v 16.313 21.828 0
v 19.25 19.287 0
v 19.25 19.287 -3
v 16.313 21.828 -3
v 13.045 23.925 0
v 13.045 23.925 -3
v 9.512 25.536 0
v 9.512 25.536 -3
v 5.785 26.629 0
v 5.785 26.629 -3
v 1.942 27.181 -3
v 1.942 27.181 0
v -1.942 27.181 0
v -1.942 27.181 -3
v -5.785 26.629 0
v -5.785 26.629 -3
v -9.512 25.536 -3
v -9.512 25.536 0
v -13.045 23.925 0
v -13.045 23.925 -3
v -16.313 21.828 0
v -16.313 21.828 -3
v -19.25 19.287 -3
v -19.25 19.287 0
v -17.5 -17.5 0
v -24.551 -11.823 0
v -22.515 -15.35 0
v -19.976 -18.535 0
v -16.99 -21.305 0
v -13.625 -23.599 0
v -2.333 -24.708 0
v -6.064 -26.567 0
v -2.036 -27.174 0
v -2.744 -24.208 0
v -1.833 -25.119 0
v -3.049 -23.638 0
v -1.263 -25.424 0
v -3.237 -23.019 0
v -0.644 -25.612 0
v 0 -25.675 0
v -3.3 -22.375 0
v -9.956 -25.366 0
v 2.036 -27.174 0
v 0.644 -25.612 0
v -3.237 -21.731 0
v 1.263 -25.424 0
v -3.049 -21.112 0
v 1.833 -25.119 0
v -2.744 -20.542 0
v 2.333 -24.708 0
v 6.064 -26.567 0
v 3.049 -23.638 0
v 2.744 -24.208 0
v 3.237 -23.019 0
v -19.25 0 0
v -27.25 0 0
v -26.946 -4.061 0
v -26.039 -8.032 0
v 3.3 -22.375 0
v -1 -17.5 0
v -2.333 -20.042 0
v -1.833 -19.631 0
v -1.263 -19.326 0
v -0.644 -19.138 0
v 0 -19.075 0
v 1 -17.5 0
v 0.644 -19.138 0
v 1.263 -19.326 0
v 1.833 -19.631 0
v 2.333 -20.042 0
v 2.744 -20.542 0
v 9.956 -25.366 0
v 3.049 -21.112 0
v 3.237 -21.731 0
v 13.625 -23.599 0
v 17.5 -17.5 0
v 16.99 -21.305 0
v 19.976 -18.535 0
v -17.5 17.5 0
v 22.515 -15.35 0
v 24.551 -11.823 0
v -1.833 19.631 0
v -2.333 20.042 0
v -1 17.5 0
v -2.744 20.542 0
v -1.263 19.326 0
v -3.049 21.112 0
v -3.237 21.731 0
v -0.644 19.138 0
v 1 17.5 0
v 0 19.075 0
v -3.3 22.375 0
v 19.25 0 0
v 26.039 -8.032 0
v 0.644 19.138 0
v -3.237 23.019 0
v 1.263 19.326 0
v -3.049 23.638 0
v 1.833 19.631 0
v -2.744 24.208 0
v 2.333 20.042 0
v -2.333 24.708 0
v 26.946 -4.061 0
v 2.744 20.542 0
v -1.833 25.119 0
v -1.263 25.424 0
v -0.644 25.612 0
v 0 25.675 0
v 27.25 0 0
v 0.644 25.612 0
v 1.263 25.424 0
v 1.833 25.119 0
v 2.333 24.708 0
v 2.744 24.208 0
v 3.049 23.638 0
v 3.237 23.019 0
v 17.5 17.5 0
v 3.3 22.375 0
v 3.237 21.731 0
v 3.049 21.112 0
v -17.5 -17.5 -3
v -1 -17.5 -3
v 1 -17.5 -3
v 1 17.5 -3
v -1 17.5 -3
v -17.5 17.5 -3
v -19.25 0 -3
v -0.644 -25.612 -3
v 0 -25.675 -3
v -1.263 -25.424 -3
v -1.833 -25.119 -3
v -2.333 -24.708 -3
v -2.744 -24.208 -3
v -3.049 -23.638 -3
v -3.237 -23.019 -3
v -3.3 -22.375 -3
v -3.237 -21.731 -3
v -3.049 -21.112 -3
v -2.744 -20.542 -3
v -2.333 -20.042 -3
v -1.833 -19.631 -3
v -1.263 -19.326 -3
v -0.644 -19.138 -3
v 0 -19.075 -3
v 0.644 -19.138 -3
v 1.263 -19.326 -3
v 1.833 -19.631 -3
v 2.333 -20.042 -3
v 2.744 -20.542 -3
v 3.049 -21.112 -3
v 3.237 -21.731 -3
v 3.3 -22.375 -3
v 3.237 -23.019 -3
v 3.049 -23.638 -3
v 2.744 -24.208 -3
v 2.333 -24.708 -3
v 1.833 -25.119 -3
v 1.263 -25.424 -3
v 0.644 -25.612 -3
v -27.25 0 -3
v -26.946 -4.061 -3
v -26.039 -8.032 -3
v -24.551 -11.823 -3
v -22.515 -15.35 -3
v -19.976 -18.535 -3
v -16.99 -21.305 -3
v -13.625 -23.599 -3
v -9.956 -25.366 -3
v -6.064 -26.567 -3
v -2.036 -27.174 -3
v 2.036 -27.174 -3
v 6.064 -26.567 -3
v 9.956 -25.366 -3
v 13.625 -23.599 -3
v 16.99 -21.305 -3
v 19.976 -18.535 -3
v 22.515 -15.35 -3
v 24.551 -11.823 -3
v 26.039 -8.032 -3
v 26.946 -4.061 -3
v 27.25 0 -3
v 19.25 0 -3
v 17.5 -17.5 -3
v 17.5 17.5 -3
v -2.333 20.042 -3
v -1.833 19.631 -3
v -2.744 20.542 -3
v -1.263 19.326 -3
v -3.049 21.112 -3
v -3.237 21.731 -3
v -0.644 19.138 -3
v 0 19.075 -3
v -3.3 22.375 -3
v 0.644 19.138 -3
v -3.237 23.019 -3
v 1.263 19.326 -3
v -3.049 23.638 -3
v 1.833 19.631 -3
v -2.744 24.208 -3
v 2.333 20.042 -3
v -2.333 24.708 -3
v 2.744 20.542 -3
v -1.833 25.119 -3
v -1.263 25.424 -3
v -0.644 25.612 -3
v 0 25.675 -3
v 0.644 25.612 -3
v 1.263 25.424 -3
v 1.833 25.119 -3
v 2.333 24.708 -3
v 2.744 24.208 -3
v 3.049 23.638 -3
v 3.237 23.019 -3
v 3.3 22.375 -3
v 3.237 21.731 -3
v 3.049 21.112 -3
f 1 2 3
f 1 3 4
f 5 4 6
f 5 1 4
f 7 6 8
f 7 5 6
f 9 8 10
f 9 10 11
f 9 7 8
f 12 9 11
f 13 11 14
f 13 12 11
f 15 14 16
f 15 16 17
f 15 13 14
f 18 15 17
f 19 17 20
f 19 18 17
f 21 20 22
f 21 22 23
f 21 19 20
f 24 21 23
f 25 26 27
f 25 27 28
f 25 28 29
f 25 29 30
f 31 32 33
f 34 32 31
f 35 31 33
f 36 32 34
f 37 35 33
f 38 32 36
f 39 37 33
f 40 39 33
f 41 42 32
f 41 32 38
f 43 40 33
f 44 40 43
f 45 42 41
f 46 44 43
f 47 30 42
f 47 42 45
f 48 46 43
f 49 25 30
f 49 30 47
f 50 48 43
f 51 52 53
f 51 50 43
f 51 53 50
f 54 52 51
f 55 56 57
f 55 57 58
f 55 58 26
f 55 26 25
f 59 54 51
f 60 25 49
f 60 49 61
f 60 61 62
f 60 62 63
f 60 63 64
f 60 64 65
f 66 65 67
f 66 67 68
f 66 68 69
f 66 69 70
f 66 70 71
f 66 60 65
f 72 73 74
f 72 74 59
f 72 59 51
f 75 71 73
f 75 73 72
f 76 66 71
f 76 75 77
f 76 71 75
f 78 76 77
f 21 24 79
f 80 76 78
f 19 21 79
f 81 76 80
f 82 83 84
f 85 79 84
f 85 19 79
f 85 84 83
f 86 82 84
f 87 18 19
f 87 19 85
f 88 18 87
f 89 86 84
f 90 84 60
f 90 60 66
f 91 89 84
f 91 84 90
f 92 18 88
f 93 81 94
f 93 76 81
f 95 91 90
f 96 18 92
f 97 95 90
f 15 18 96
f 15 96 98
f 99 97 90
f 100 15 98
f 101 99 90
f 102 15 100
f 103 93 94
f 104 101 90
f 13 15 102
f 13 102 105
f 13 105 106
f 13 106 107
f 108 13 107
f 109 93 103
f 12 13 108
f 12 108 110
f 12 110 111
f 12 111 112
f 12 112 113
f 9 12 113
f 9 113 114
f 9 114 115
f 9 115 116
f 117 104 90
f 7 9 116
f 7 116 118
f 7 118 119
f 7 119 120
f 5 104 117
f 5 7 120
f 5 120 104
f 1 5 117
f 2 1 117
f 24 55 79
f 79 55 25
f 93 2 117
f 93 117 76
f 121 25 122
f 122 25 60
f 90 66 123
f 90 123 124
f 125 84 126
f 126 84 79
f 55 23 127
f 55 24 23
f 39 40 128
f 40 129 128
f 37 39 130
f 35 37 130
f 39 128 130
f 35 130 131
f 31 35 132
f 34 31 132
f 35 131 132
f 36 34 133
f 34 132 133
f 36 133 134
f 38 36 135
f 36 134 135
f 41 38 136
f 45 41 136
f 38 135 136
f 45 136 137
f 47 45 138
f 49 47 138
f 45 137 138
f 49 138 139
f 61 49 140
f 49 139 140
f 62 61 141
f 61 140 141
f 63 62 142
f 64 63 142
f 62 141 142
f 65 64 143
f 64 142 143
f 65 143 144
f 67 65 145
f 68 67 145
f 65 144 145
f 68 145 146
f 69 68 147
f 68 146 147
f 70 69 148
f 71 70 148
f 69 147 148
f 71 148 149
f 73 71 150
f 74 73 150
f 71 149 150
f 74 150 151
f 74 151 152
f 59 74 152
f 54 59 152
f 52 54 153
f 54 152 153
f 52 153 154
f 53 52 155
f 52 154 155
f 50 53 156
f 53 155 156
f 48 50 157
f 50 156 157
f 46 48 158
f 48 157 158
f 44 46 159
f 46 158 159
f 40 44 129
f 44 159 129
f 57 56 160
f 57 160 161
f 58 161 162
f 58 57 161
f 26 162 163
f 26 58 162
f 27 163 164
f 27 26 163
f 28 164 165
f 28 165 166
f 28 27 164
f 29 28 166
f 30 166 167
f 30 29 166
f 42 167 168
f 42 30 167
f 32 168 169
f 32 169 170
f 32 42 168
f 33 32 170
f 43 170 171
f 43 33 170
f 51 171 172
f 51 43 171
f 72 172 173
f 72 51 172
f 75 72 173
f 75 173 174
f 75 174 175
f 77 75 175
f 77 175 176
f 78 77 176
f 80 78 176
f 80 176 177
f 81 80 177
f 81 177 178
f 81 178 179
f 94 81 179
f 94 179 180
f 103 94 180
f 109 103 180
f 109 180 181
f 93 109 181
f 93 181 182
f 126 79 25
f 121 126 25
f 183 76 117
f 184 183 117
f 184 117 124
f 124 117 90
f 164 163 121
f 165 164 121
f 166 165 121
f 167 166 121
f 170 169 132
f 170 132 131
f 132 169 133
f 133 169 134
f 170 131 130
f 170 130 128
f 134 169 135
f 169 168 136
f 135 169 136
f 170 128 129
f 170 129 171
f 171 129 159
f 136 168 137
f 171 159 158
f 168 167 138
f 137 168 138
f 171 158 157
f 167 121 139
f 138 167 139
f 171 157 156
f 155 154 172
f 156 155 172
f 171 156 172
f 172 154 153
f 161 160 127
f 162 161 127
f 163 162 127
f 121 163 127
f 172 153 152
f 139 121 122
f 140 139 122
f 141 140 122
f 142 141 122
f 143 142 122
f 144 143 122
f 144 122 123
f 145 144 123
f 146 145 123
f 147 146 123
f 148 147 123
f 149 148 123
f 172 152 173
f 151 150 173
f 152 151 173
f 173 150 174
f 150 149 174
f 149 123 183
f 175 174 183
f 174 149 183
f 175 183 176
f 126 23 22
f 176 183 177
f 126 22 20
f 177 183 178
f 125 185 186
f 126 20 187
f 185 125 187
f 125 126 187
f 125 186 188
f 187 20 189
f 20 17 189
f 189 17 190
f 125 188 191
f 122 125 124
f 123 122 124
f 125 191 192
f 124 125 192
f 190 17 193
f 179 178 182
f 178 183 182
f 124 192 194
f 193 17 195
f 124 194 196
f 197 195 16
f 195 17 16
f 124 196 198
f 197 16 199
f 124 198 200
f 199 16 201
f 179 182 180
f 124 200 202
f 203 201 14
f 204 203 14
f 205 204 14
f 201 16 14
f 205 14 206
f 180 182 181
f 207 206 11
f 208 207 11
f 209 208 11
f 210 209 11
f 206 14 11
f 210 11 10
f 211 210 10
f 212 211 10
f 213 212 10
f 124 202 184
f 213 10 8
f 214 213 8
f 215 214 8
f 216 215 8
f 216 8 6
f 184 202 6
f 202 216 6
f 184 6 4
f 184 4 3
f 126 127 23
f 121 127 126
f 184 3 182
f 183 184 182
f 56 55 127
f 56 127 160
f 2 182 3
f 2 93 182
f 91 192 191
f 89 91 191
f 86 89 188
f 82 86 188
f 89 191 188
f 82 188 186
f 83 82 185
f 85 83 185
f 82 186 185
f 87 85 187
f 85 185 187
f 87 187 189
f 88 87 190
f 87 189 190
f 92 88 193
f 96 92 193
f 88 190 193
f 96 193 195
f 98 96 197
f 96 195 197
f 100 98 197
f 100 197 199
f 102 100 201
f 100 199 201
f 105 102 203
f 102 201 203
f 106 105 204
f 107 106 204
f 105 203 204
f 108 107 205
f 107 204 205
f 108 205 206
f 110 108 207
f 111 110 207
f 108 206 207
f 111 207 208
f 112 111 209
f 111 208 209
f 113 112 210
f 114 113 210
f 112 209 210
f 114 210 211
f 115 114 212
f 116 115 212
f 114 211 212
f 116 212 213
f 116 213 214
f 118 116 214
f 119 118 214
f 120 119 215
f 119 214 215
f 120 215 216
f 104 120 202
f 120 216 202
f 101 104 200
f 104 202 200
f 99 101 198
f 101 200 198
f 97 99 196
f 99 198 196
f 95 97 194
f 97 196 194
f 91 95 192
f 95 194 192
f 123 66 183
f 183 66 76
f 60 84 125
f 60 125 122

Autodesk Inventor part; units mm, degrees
ref_plane "YZ Plane" through (0, 0, 0) normal (1, 0, 0) x (0, 1, 0)
ref_plane "XZ Plane" through (0, 0, 0) normal (0, 1, 0) x (-1, 0, 0)
ref_plane "XY Plane" through (0, 0, 0) normal (0, 0, 1) x (1, 0, 0)
sketch "スケッチ1" plane through (0, 0, 0) normal (0, 0, 1) x (1, 0, 0)
  circle A0 centre (0, 0) radius 27.25
  line L0 (17.5, 17.5) -> (-17.5, 17.5)
  line L1 (-17.5, 17.5) -> (-17.5, -17.5)
  line L2 (-17.5, -17.5) -> (17.5, -17.5)
  line L3 (17.5, -17.5) -> (17.5, 17.5)
  line L4 (17.5, 17.5) -> (-17.5, -17.5) construction
  line L5 (-17.5, 17.5) -> (17.5, -17.5) construction
  line L6 (1, 17.5) -> (-1, 17.5)
  line L7 (-1, 17.5) -> (-1, -17.5)
  line L8 (-1, -17.5) -> (1, -17.5)
  line L9 (1, -17.5) -> (1, 17.5)
  line L10 (1, 17.5) -> (-1, -17.5) construction
  line L11 (-1, 17.5) -> (1, -17.5) construction
  point P0 (1, -17.5)
  point P1 (1, 17.5)
  point P2 (-1, 17.5)
  point P3 (-1, -17.5)
  dimension "d0" = 54.5
  dimension "d6" = 35
  dimension "d107" = 2
  dimension "d108" = 35
extrude "押し出し1" add sketch "スケッチ1" against normal blind 3 contours A0 | L9 L2 L7 L0
sketch "スケッチ2" plane through (0, 0, 0) normal (0, 0, 1) x (1, 0, 0)
  line L0 (0, 42.4511) -> (0, -37.5489)
  line L1 (38.0038, 0) -> (-41.9962, 0)
  line L2 (27.25, 42.0143) -> (27.25, -37.9857)
  circle A0 centre (0, 0) radius 27.25 projected
  line L3 (17.5, 17.5) -> (17.5, -17.5) projected
  line L4 (19.25, 25) -> (27.25, 25)
  line L5 (27.25, 25) -> (27.25, -25)
  line L6 (27.25, -25) -> (19.25, -25)
  line L7 (19.25, -25) -> (19.25, 25)
  line L8 (19.25, 25) -> (27.25, -25) construction
  line L9 (27.25, 25) -> (19.25, -25) construction
  point P0 (17.5, 0)
  point P1 (23.25, 0)
  point P2 (19.25, 0)
  point P3 (27.25, 0)
  dimension "d13" = 9.75
  dimension "d14" = 8
  dimension "d15" = 50
  dimension "d19" = 54.5
  dimension "d110" = 1.75
extrude "押し出し2" cut sketch "スケッチ2" against normal blind 10 contours L7 L4 L2 A0 | A0 L1 L7 picked at (20.3822, 11.481)
mirror "ミラー1" about plane through (0, 0, 0) normal (1, 0, 0) of "押し出し2"
sketch "スケッチ8" plane through (0, 0, 0) normal (0, 0, 1) x (1, 0, 0)
  circle A0 centre (0, 0) radius 22.375
  circle A1 centre (0, 0) radius 27.25
  line L0 (0, 31.1603) -> (0, -30.8706)
  point P0 (0, 0)
  point P1 (0, 22.375)
  point P2 (0, -22.375)
  dimension "d112" = 44.75
  dimension "d113" = 54.5
hole "穴5" at (0, 22.375, 0) at (0, -22.375, 0) direction (0, 0, -1) diameter 6.6 end through all clearance for "Countersunk Flat Head Screw ISO 2009/7046" size "M6" standard "ISO"
properties part number "Part3_A_Y" material "鋼、軟鋼"
